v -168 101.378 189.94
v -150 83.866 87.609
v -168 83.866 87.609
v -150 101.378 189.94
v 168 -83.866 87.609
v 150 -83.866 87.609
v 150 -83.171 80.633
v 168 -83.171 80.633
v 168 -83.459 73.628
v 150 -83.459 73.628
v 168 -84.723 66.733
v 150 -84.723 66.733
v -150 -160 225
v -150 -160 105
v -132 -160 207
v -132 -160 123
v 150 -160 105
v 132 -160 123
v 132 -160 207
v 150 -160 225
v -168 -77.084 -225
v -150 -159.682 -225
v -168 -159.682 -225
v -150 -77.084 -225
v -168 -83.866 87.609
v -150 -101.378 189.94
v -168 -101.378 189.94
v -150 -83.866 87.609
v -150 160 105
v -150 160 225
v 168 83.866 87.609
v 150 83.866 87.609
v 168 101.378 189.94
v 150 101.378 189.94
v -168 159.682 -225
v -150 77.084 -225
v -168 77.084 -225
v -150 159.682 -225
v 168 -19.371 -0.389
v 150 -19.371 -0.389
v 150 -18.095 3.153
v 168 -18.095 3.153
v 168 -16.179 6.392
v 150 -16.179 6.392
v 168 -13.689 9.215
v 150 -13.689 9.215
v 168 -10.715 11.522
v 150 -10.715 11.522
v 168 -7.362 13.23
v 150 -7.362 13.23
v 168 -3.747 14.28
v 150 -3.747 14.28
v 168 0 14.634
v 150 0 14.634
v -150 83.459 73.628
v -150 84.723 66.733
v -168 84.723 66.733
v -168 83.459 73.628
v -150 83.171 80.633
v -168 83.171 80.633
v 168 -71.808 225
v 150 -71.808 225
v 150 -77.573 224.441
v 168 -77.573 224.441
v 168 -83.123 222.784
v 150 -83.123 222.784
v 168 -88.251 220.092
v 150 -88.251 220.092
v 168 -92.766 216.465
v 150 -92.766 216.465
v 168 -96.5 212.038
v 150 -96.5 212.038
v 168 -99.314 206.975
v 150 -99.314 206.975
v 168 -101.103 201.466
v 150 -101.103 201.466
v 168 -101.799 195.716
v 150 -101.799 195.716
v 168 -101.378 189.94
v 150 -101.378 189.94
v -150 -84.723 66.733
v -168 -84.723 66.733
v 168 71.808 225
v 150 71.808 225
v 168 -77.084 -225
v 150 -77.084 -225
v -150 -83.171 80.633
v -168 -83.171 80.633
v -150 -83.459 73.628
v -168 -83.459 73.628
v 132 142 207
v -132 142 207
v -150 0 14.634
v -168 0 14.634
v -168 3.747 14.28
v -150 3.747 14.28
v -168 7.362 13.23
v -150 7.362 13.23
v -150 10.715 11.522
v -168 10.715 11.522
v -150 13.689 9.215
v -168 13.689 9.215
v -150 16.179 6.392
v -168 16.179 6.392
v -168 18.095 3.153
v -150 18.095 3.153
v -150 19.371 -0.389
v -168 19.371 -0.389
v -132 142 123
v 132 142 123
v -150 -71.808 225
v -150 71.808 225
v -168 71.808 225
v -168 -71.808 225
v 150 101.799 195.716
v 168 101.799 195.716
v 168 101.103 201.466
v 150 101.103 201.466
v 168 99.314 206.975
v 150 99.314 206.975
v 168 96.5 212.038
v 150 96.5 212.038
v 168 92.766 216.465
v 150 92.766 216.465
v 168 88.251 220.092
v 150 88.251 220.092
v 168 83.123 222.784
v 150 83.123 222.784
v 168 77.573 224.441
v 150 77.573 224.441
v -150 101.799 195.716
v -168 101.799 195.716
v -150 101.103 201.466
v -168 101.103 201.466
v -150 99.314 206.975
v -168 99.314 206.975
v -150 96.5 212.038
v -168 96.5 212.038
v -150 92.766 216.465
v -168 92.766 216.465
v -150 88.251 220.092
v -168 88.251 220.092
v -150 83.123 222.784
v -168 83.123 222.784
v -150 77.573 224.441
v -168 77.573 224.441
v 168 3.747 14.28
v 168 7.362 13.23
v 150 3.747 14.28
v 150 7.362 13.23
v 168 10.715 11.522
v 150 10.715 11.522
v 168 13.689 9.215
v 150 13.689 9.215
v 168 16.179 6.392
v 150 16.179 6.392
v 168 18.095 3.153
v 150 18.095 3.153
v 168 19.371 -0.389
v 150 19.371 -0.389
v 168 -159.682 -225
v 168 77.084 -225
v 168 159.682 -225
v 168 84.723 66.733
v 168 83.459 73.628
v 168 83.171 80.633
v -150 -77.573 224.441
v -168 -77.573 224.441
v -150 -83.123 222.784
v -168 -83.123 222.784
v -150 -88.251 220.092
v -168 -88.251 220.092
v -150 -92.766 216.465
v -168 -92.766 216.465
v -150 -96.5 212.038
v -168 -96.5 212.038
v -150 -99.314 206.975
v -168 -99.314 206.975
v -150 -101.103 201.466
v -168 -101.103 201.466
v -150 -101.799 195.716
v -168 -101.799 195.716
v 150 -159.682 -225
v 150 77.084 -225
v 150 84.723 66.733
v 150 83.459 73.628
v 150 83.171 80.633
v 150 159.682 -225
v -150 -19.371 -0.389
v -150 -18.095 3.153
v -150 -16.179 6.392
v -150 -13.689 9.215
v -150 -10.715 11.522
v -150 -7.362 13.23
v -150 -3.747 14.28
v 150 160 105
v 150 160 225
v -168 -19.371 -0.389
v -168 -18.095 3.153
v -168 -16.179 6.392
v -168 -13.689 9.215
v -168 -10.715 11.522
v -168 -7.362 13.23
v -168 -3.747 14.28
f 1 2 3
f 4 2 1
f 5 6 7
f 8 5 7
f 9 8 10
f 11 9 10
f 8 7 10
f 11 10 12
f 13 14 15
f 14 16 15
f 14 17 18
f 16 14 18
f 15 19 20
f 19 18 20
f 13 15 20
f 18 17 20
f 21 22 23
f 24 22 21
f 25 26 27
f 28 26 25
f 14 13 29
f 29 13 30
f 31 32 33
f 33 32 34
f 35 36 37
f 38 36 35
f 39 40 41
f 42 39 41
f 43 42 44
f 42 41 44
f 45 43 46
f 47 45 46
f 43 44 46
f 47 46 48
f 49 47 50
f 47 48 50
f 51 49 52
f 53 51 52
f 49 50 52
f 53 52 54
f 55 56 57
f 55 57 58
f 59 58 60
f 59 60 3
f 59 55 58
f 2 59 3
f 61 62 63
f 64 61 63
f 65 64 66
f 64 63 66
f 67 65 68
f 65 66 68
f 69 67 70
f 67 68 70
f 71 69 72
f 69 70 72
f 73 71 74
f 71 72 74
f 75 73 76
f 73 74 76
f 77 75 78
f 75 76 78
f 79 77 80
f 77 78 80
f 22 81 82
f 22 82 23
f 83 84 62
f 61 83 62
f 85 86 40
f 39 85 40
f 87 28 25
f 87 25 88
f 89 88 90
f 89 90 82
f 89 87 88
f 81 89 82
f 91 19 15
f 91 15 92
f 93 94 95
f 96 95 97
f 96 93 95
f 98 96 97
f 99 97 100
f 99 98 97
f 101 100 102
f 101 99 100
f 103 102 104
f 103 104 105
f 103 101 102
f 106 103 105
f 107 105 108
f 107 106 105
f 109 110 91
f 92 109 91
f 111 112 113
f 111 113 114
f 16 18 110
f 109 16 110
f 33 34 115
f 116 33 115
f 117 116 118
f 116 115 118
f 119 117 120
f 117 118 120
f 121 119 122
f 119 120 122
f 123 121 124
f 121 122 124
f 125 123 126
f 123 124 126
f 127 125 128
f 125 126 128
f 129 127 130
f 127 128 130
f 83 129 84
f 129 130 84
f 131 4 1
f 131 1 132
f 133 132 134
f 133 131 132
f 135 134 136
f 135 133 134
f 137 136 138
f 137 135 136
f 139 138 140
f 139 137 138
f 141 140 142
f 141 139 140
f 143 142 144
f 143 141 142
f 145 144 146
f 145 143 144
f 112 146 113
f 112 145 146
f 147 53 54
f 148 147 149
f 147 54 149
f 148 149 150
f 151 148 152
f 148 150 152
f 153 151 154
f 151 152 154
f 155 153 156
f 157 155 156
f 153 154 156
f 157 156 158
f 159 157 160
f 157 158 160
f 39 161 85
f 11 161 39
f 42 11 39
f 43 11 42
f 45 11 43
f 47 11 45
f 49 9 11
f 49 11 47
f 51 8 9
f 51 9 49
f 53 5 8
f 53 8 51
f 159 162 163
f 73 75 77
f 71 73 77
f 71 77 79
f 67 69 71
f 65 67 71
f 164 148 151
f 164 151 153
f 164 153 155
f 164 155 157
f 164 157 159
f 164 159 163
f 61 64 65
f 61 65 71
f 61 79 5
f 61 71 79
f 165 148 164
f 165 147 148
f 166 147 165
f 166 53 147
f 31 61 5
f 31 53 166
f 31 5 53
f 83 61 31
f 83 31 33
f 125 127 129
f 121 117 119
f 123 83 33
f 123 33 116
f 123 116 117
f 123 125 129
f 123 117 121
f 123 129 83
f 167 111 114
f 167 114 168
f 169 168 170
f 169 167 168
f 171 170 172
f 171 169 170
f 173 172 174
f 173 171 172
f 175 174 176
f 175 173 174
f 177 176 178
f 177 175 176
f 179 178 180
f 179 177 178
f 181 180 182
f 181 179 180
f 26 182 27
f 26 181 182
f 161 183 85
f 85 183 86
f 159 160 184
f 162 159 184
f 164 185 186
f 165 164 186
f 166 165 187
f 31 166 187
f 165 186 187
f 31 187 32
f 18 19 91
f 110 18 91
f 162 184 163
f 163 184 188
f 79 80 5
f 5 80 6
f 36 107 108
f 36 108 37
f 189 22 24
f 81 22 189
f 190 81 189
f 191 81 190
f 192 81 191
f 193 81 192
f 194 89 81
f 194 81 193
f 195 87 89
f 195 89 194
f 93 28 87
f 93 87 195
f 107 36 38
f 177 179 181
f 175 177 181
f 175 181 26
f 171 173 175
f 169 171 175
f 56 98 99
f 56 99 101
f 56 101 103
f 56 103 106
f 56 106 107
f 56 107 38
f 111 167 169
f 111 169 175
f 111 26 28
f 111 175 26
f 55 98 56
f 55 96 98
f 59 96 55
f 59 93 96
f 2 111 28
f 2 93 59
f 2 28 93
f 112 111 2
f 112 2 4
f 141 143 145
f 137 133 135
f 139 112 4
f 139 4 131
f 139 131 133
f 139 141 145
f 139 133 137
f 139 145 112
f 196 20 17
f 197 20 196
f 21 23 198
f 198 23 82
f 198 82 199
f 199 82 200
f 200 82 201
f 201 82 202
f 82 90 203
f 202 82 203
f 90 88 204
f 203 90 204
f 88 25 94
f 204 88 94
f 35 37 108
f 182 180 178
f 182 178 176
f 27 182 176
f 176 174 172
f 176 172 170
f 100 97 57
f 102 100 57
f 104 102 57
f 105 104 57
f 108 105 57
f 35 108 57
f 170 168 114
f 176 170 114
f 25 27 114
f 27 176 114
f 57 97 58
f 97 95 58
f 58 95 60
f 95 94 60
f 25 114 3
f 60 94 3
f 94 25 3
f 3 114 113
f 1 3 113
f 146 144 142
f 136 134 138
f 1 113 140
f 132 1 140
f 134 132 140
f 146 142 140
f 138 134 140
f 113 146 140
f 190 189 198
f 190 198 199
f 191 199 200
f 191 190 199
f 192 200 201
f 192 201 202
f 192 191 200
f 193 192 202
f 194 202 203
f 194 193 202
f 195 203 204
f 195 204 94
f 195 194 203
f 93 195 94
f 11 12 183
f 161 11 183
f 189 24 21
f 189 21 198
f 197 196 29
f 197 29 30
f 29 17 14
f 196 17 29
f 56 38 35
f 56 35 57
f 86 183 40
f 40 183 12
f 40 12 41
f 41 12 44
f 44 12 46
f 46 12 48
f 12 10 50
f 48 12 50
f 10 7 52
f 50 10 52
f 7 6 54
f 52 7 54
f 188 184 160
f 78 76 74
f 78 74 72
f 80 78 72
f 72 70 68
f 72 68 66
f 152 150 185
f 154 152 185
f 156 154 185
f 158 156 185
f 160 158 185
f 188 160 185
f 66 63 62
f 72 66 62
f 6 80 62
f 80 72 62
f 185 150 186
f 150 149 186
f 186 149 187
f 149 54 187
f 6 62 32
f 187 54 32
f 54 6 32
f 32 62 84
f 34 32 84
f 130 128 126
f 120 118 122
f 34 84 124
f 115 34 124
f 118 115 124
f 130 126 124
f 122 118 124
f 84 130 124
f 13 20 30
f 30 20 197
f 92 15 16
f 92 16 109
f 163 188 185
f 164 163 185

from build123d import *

# Parameters (mm, degrees)
F2_DEPTH = 18
F3_W     = 320
F3_H     = 120
F4_DEPTH = 150
F6_T     = -18


with BuildPart() as f2:
    # F1 (on offset) → F2 (new body)
    with BuildSketch(Plane.YZ.offset(150)):
        with BuildLine():
            Line((71.807722, 225), (-71.807722, 225))
            ThreePointArc((-71.807722, 225), (-94.740323, 214.341556), (-101.377868, 189.939721))
            Line((-101.377868, 189.939721), (-83.866298, 87.609463))
            ThreePointArc((-83.866298, 87.609463), (-83.191914, 77.125763), (-84.72293, 66.732555))
            Line((-84.72293, 66.732555), (-159.682438, -225))
            Line((-159.682438, -225), (-77.083794, -225))
            Line((-77.083794, -225), (-19.370778, -0.388524))
            ThreePointArc((-19.370778, -0.388524), (-12.256735, 10.438423), (0, 14.634233))
            ThreePointArc((0, 14.634233), (12.256735, 10.438423), (19.370778, -0.388524))
            Line((19.370778, -0.388524), (77.083794, -225))
            Line((77.083794, -225), (159.682438, -225))
            Line((159.682438, -225), (84.72293, 66.732555))
            ThreePointArc((84.72293, 66.732555), (83.191914, 77.125763), (83.866298, 87.609463))
            Line((83.866298, 87.609463), (101.377868, 189.939721))
            ThreePointArc((101.377868, 189.939721), (94.740323, 214.341556), (71.807722, 225))
        make_face()
    extrude(amount=F2_DEPTH)


with BuildPart() as f4:
    # F3 (on Right) → F4 (new body, symmetric)
    with BuildSketch(Plane.YZ):
        with Locations((0, 165)):
            Rectangle(F3_W, F3_H)
    extrude(amount=F4_DEPTH, both=True)

    # F6
    f6_openings = [f4.faces().sort_by_distance(p)[0] for p in [
        (0, -160, 165),
    ]]
    offset(amount=F6_T, openings=f6_openings)


with BuildPart() as f5_1:
    # F5: instance of F2
    add(f2.part.mirror(Plane.YZ))


solid = Compound([f2.part, f4.part, f5_1.part])
